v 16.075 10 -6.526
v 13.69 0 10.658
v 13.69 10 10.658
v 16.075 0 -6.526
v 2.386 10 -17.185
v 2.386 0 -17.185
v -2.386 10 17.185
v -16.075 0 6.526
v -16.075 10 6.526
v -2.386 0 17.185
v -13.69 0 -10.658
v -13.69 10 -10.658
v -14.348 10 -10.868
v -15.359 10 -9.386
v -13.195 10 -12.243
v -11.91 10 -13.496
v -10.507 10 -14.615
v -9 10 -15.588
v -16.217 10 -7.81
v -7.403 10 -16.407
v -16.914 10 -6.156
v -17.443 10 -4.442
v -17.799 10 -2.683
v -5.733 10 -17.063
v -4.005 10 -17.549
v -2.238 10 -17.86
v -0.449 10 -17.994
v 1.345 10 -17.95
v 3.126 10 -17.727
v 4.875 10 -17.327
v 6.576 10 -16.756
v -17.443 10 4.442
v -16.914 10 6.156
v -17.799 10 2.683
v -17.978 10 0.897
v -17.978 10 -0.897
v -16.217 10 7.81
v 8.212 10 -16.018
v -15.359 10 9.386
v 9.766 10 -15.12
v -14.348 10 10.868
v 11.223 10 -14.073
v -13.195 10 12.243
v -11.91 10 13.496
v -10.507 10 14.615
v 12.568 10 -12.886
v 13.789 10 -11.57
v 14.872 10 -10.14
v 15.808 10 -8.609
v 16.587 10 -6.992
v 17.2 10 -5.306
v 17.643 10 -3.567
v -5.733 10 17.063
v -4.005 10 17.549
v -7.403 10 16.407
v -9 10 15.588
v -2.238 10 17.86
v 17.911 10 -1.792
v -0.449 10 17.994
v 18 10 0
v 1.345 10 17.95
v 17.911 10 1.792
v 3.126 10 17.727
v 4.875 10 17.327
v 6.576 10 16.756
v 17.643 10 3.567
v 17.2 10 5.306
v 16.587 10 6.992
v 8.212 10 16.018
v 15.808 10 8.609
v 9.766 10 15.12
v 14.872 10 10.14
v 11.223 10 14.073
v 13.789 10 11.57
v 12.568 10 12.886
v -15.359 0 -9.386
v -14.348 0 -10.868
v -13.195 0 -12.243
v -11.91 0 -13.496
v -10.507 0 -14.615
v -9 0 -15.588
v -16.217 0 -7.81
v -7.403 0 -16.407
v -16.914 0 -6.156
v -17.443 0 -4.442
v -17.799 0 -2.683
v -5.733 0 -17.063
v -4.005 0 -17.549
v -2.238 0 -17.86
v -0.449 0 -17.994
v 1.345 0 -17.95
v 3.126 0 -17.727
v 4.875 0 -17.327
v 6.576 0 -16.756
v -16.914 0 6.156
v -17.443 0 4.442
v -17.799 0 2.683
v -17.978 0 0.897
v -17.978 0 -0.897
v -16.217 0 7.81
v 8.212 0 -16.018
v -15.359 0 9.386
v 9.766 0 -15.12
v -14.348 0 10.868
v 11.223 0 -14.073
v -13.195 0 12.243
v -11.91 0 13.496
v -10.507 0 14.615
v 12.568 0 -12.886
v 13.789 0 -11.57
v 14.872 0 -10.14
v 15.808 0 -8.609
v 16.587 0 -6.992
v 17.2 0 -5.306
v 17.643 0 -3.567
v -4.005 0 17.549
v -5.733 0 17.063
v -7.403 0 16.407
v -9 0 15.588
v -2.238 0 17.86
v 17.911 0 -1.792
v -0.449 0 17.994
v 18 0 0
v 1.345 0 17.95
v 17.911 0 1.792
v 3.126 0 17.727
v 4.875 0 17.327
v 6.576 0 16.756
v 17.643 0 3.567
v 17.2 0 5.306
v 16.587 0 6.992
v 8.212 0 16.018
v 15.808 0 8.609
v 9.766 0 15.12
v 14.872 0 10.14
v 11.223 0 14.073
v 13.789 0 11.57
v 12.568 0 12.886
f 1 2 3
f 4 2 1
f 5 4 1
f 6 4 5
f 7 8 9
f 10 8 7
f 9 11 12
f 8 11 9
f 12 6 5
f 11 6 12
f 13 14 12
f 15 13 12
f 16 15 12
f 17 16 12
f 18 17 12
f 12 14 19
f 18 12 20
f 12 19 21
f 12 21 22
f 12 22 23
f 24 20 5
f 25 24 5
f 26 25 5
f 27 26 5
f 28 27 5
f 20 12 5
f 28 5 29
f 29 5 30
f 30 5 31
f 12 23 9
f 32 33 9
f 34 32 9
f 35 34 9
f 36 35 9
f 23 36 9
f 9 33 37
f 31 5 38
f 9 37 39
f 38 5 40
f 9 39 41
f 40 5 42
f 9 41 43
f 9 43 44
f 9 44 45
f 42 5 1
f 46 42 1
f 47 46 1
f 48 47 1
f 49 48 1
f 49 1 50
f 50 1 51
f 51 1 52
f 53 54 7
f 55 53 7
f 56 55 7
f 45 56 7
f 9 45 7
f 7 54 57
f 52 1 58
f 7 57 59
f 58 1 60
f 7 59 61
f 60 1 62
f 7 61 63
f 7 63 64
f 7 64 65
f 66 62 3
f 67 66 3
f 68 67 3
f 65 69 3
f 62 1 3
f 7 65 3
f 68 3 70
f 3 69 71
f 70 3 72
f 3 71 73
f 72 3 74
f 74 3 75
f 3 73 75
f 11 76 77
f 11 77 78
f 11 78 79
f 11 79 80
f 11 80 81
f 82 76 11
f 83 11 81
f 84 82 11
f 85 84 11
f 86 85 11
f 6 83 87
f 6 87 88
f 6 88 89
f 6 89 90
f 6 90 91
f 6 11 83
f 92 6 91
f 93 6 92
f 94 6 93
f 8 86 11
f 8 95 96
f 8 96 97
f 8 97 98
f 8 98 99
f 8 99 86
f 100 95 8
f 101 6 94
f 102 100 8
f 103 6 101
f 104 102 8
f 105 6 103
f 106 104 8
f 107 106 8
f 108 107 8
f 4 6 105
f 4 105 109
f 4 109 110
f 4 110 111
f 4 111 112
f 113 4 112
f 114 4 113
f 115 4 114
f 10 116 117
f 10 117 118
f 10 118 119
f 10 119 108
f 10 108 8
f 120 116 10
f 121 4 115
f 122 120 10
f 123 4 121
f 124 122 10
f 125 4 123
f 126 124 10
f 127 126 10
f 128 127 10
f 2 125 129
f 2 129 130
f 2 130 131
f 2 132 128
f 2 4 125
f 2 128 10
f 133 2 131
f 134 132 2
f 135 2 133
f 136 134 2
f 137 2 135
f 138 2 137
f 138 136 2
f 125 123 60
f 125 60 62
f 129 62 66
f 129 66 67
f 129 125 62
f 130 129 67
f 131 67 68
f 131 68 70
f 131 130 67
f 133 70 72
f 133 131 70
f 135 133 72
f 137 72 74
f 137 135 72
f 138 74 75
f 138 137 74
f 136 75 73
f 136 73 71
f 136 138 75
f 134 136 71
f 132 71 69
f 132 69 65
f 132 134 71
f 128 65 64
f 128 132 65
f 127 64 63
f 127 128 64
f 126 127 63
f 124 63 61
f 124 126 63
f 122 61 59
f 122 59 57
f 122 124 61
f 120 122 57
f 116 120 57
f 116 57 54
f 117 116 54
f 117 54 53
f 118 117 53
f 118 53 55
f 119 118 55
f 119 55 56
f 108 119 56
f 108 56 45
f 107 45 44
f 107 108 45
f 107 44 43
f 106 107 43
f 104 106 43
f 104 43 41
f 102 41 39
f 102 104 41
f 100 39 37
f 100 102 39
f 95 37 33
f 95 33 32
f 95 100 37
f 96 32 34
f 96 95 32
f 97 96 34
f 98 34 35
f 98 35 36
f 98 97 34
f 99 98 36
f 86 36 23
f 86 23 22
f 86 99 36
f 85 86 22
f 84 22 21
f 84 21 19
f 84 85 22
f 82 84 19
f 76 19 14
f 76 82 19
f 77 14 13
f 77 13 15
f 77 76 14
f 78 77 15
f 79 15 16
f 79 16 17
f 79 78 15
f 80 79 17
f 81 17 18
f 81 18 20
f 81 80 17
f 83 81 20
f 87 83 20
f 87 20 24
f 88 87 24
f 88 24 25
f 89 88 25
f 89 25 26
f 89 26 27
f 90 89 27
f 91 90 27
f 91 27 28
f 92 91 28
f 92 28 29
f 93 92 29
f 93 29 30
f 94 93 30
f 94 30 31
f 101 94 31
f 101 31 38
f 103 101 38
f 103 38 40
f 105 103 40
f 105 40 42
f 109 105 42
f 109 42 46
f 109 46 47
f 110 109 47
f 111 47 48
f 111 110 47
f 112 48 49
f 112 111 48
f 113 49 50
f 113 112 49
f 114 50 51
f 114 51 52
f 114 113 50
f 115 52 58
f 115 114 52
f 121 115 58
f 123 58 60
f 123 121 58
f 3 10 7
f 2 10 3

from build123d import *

# Parameters (mm, degrees)
F0_R     = 18
F1_DEPTH = 10


with BuildPart() as f1:
    # F0 (on Front) → F1 (new body)
    with BuildSketch(Plane.XZ):
        Circle(F0_R)
        Polygon((-16.075068, 6.526333), (-2.385564, 17.184584), (13.689504, 10.658251), (16.075068, -6.526333), (2.385564, -17.184584), (-13.689504, -10.658251), align=None, mode=Mode.SUBTRACT)
    extrude(amount=-F1_DEPTH)


solid = f1.part
